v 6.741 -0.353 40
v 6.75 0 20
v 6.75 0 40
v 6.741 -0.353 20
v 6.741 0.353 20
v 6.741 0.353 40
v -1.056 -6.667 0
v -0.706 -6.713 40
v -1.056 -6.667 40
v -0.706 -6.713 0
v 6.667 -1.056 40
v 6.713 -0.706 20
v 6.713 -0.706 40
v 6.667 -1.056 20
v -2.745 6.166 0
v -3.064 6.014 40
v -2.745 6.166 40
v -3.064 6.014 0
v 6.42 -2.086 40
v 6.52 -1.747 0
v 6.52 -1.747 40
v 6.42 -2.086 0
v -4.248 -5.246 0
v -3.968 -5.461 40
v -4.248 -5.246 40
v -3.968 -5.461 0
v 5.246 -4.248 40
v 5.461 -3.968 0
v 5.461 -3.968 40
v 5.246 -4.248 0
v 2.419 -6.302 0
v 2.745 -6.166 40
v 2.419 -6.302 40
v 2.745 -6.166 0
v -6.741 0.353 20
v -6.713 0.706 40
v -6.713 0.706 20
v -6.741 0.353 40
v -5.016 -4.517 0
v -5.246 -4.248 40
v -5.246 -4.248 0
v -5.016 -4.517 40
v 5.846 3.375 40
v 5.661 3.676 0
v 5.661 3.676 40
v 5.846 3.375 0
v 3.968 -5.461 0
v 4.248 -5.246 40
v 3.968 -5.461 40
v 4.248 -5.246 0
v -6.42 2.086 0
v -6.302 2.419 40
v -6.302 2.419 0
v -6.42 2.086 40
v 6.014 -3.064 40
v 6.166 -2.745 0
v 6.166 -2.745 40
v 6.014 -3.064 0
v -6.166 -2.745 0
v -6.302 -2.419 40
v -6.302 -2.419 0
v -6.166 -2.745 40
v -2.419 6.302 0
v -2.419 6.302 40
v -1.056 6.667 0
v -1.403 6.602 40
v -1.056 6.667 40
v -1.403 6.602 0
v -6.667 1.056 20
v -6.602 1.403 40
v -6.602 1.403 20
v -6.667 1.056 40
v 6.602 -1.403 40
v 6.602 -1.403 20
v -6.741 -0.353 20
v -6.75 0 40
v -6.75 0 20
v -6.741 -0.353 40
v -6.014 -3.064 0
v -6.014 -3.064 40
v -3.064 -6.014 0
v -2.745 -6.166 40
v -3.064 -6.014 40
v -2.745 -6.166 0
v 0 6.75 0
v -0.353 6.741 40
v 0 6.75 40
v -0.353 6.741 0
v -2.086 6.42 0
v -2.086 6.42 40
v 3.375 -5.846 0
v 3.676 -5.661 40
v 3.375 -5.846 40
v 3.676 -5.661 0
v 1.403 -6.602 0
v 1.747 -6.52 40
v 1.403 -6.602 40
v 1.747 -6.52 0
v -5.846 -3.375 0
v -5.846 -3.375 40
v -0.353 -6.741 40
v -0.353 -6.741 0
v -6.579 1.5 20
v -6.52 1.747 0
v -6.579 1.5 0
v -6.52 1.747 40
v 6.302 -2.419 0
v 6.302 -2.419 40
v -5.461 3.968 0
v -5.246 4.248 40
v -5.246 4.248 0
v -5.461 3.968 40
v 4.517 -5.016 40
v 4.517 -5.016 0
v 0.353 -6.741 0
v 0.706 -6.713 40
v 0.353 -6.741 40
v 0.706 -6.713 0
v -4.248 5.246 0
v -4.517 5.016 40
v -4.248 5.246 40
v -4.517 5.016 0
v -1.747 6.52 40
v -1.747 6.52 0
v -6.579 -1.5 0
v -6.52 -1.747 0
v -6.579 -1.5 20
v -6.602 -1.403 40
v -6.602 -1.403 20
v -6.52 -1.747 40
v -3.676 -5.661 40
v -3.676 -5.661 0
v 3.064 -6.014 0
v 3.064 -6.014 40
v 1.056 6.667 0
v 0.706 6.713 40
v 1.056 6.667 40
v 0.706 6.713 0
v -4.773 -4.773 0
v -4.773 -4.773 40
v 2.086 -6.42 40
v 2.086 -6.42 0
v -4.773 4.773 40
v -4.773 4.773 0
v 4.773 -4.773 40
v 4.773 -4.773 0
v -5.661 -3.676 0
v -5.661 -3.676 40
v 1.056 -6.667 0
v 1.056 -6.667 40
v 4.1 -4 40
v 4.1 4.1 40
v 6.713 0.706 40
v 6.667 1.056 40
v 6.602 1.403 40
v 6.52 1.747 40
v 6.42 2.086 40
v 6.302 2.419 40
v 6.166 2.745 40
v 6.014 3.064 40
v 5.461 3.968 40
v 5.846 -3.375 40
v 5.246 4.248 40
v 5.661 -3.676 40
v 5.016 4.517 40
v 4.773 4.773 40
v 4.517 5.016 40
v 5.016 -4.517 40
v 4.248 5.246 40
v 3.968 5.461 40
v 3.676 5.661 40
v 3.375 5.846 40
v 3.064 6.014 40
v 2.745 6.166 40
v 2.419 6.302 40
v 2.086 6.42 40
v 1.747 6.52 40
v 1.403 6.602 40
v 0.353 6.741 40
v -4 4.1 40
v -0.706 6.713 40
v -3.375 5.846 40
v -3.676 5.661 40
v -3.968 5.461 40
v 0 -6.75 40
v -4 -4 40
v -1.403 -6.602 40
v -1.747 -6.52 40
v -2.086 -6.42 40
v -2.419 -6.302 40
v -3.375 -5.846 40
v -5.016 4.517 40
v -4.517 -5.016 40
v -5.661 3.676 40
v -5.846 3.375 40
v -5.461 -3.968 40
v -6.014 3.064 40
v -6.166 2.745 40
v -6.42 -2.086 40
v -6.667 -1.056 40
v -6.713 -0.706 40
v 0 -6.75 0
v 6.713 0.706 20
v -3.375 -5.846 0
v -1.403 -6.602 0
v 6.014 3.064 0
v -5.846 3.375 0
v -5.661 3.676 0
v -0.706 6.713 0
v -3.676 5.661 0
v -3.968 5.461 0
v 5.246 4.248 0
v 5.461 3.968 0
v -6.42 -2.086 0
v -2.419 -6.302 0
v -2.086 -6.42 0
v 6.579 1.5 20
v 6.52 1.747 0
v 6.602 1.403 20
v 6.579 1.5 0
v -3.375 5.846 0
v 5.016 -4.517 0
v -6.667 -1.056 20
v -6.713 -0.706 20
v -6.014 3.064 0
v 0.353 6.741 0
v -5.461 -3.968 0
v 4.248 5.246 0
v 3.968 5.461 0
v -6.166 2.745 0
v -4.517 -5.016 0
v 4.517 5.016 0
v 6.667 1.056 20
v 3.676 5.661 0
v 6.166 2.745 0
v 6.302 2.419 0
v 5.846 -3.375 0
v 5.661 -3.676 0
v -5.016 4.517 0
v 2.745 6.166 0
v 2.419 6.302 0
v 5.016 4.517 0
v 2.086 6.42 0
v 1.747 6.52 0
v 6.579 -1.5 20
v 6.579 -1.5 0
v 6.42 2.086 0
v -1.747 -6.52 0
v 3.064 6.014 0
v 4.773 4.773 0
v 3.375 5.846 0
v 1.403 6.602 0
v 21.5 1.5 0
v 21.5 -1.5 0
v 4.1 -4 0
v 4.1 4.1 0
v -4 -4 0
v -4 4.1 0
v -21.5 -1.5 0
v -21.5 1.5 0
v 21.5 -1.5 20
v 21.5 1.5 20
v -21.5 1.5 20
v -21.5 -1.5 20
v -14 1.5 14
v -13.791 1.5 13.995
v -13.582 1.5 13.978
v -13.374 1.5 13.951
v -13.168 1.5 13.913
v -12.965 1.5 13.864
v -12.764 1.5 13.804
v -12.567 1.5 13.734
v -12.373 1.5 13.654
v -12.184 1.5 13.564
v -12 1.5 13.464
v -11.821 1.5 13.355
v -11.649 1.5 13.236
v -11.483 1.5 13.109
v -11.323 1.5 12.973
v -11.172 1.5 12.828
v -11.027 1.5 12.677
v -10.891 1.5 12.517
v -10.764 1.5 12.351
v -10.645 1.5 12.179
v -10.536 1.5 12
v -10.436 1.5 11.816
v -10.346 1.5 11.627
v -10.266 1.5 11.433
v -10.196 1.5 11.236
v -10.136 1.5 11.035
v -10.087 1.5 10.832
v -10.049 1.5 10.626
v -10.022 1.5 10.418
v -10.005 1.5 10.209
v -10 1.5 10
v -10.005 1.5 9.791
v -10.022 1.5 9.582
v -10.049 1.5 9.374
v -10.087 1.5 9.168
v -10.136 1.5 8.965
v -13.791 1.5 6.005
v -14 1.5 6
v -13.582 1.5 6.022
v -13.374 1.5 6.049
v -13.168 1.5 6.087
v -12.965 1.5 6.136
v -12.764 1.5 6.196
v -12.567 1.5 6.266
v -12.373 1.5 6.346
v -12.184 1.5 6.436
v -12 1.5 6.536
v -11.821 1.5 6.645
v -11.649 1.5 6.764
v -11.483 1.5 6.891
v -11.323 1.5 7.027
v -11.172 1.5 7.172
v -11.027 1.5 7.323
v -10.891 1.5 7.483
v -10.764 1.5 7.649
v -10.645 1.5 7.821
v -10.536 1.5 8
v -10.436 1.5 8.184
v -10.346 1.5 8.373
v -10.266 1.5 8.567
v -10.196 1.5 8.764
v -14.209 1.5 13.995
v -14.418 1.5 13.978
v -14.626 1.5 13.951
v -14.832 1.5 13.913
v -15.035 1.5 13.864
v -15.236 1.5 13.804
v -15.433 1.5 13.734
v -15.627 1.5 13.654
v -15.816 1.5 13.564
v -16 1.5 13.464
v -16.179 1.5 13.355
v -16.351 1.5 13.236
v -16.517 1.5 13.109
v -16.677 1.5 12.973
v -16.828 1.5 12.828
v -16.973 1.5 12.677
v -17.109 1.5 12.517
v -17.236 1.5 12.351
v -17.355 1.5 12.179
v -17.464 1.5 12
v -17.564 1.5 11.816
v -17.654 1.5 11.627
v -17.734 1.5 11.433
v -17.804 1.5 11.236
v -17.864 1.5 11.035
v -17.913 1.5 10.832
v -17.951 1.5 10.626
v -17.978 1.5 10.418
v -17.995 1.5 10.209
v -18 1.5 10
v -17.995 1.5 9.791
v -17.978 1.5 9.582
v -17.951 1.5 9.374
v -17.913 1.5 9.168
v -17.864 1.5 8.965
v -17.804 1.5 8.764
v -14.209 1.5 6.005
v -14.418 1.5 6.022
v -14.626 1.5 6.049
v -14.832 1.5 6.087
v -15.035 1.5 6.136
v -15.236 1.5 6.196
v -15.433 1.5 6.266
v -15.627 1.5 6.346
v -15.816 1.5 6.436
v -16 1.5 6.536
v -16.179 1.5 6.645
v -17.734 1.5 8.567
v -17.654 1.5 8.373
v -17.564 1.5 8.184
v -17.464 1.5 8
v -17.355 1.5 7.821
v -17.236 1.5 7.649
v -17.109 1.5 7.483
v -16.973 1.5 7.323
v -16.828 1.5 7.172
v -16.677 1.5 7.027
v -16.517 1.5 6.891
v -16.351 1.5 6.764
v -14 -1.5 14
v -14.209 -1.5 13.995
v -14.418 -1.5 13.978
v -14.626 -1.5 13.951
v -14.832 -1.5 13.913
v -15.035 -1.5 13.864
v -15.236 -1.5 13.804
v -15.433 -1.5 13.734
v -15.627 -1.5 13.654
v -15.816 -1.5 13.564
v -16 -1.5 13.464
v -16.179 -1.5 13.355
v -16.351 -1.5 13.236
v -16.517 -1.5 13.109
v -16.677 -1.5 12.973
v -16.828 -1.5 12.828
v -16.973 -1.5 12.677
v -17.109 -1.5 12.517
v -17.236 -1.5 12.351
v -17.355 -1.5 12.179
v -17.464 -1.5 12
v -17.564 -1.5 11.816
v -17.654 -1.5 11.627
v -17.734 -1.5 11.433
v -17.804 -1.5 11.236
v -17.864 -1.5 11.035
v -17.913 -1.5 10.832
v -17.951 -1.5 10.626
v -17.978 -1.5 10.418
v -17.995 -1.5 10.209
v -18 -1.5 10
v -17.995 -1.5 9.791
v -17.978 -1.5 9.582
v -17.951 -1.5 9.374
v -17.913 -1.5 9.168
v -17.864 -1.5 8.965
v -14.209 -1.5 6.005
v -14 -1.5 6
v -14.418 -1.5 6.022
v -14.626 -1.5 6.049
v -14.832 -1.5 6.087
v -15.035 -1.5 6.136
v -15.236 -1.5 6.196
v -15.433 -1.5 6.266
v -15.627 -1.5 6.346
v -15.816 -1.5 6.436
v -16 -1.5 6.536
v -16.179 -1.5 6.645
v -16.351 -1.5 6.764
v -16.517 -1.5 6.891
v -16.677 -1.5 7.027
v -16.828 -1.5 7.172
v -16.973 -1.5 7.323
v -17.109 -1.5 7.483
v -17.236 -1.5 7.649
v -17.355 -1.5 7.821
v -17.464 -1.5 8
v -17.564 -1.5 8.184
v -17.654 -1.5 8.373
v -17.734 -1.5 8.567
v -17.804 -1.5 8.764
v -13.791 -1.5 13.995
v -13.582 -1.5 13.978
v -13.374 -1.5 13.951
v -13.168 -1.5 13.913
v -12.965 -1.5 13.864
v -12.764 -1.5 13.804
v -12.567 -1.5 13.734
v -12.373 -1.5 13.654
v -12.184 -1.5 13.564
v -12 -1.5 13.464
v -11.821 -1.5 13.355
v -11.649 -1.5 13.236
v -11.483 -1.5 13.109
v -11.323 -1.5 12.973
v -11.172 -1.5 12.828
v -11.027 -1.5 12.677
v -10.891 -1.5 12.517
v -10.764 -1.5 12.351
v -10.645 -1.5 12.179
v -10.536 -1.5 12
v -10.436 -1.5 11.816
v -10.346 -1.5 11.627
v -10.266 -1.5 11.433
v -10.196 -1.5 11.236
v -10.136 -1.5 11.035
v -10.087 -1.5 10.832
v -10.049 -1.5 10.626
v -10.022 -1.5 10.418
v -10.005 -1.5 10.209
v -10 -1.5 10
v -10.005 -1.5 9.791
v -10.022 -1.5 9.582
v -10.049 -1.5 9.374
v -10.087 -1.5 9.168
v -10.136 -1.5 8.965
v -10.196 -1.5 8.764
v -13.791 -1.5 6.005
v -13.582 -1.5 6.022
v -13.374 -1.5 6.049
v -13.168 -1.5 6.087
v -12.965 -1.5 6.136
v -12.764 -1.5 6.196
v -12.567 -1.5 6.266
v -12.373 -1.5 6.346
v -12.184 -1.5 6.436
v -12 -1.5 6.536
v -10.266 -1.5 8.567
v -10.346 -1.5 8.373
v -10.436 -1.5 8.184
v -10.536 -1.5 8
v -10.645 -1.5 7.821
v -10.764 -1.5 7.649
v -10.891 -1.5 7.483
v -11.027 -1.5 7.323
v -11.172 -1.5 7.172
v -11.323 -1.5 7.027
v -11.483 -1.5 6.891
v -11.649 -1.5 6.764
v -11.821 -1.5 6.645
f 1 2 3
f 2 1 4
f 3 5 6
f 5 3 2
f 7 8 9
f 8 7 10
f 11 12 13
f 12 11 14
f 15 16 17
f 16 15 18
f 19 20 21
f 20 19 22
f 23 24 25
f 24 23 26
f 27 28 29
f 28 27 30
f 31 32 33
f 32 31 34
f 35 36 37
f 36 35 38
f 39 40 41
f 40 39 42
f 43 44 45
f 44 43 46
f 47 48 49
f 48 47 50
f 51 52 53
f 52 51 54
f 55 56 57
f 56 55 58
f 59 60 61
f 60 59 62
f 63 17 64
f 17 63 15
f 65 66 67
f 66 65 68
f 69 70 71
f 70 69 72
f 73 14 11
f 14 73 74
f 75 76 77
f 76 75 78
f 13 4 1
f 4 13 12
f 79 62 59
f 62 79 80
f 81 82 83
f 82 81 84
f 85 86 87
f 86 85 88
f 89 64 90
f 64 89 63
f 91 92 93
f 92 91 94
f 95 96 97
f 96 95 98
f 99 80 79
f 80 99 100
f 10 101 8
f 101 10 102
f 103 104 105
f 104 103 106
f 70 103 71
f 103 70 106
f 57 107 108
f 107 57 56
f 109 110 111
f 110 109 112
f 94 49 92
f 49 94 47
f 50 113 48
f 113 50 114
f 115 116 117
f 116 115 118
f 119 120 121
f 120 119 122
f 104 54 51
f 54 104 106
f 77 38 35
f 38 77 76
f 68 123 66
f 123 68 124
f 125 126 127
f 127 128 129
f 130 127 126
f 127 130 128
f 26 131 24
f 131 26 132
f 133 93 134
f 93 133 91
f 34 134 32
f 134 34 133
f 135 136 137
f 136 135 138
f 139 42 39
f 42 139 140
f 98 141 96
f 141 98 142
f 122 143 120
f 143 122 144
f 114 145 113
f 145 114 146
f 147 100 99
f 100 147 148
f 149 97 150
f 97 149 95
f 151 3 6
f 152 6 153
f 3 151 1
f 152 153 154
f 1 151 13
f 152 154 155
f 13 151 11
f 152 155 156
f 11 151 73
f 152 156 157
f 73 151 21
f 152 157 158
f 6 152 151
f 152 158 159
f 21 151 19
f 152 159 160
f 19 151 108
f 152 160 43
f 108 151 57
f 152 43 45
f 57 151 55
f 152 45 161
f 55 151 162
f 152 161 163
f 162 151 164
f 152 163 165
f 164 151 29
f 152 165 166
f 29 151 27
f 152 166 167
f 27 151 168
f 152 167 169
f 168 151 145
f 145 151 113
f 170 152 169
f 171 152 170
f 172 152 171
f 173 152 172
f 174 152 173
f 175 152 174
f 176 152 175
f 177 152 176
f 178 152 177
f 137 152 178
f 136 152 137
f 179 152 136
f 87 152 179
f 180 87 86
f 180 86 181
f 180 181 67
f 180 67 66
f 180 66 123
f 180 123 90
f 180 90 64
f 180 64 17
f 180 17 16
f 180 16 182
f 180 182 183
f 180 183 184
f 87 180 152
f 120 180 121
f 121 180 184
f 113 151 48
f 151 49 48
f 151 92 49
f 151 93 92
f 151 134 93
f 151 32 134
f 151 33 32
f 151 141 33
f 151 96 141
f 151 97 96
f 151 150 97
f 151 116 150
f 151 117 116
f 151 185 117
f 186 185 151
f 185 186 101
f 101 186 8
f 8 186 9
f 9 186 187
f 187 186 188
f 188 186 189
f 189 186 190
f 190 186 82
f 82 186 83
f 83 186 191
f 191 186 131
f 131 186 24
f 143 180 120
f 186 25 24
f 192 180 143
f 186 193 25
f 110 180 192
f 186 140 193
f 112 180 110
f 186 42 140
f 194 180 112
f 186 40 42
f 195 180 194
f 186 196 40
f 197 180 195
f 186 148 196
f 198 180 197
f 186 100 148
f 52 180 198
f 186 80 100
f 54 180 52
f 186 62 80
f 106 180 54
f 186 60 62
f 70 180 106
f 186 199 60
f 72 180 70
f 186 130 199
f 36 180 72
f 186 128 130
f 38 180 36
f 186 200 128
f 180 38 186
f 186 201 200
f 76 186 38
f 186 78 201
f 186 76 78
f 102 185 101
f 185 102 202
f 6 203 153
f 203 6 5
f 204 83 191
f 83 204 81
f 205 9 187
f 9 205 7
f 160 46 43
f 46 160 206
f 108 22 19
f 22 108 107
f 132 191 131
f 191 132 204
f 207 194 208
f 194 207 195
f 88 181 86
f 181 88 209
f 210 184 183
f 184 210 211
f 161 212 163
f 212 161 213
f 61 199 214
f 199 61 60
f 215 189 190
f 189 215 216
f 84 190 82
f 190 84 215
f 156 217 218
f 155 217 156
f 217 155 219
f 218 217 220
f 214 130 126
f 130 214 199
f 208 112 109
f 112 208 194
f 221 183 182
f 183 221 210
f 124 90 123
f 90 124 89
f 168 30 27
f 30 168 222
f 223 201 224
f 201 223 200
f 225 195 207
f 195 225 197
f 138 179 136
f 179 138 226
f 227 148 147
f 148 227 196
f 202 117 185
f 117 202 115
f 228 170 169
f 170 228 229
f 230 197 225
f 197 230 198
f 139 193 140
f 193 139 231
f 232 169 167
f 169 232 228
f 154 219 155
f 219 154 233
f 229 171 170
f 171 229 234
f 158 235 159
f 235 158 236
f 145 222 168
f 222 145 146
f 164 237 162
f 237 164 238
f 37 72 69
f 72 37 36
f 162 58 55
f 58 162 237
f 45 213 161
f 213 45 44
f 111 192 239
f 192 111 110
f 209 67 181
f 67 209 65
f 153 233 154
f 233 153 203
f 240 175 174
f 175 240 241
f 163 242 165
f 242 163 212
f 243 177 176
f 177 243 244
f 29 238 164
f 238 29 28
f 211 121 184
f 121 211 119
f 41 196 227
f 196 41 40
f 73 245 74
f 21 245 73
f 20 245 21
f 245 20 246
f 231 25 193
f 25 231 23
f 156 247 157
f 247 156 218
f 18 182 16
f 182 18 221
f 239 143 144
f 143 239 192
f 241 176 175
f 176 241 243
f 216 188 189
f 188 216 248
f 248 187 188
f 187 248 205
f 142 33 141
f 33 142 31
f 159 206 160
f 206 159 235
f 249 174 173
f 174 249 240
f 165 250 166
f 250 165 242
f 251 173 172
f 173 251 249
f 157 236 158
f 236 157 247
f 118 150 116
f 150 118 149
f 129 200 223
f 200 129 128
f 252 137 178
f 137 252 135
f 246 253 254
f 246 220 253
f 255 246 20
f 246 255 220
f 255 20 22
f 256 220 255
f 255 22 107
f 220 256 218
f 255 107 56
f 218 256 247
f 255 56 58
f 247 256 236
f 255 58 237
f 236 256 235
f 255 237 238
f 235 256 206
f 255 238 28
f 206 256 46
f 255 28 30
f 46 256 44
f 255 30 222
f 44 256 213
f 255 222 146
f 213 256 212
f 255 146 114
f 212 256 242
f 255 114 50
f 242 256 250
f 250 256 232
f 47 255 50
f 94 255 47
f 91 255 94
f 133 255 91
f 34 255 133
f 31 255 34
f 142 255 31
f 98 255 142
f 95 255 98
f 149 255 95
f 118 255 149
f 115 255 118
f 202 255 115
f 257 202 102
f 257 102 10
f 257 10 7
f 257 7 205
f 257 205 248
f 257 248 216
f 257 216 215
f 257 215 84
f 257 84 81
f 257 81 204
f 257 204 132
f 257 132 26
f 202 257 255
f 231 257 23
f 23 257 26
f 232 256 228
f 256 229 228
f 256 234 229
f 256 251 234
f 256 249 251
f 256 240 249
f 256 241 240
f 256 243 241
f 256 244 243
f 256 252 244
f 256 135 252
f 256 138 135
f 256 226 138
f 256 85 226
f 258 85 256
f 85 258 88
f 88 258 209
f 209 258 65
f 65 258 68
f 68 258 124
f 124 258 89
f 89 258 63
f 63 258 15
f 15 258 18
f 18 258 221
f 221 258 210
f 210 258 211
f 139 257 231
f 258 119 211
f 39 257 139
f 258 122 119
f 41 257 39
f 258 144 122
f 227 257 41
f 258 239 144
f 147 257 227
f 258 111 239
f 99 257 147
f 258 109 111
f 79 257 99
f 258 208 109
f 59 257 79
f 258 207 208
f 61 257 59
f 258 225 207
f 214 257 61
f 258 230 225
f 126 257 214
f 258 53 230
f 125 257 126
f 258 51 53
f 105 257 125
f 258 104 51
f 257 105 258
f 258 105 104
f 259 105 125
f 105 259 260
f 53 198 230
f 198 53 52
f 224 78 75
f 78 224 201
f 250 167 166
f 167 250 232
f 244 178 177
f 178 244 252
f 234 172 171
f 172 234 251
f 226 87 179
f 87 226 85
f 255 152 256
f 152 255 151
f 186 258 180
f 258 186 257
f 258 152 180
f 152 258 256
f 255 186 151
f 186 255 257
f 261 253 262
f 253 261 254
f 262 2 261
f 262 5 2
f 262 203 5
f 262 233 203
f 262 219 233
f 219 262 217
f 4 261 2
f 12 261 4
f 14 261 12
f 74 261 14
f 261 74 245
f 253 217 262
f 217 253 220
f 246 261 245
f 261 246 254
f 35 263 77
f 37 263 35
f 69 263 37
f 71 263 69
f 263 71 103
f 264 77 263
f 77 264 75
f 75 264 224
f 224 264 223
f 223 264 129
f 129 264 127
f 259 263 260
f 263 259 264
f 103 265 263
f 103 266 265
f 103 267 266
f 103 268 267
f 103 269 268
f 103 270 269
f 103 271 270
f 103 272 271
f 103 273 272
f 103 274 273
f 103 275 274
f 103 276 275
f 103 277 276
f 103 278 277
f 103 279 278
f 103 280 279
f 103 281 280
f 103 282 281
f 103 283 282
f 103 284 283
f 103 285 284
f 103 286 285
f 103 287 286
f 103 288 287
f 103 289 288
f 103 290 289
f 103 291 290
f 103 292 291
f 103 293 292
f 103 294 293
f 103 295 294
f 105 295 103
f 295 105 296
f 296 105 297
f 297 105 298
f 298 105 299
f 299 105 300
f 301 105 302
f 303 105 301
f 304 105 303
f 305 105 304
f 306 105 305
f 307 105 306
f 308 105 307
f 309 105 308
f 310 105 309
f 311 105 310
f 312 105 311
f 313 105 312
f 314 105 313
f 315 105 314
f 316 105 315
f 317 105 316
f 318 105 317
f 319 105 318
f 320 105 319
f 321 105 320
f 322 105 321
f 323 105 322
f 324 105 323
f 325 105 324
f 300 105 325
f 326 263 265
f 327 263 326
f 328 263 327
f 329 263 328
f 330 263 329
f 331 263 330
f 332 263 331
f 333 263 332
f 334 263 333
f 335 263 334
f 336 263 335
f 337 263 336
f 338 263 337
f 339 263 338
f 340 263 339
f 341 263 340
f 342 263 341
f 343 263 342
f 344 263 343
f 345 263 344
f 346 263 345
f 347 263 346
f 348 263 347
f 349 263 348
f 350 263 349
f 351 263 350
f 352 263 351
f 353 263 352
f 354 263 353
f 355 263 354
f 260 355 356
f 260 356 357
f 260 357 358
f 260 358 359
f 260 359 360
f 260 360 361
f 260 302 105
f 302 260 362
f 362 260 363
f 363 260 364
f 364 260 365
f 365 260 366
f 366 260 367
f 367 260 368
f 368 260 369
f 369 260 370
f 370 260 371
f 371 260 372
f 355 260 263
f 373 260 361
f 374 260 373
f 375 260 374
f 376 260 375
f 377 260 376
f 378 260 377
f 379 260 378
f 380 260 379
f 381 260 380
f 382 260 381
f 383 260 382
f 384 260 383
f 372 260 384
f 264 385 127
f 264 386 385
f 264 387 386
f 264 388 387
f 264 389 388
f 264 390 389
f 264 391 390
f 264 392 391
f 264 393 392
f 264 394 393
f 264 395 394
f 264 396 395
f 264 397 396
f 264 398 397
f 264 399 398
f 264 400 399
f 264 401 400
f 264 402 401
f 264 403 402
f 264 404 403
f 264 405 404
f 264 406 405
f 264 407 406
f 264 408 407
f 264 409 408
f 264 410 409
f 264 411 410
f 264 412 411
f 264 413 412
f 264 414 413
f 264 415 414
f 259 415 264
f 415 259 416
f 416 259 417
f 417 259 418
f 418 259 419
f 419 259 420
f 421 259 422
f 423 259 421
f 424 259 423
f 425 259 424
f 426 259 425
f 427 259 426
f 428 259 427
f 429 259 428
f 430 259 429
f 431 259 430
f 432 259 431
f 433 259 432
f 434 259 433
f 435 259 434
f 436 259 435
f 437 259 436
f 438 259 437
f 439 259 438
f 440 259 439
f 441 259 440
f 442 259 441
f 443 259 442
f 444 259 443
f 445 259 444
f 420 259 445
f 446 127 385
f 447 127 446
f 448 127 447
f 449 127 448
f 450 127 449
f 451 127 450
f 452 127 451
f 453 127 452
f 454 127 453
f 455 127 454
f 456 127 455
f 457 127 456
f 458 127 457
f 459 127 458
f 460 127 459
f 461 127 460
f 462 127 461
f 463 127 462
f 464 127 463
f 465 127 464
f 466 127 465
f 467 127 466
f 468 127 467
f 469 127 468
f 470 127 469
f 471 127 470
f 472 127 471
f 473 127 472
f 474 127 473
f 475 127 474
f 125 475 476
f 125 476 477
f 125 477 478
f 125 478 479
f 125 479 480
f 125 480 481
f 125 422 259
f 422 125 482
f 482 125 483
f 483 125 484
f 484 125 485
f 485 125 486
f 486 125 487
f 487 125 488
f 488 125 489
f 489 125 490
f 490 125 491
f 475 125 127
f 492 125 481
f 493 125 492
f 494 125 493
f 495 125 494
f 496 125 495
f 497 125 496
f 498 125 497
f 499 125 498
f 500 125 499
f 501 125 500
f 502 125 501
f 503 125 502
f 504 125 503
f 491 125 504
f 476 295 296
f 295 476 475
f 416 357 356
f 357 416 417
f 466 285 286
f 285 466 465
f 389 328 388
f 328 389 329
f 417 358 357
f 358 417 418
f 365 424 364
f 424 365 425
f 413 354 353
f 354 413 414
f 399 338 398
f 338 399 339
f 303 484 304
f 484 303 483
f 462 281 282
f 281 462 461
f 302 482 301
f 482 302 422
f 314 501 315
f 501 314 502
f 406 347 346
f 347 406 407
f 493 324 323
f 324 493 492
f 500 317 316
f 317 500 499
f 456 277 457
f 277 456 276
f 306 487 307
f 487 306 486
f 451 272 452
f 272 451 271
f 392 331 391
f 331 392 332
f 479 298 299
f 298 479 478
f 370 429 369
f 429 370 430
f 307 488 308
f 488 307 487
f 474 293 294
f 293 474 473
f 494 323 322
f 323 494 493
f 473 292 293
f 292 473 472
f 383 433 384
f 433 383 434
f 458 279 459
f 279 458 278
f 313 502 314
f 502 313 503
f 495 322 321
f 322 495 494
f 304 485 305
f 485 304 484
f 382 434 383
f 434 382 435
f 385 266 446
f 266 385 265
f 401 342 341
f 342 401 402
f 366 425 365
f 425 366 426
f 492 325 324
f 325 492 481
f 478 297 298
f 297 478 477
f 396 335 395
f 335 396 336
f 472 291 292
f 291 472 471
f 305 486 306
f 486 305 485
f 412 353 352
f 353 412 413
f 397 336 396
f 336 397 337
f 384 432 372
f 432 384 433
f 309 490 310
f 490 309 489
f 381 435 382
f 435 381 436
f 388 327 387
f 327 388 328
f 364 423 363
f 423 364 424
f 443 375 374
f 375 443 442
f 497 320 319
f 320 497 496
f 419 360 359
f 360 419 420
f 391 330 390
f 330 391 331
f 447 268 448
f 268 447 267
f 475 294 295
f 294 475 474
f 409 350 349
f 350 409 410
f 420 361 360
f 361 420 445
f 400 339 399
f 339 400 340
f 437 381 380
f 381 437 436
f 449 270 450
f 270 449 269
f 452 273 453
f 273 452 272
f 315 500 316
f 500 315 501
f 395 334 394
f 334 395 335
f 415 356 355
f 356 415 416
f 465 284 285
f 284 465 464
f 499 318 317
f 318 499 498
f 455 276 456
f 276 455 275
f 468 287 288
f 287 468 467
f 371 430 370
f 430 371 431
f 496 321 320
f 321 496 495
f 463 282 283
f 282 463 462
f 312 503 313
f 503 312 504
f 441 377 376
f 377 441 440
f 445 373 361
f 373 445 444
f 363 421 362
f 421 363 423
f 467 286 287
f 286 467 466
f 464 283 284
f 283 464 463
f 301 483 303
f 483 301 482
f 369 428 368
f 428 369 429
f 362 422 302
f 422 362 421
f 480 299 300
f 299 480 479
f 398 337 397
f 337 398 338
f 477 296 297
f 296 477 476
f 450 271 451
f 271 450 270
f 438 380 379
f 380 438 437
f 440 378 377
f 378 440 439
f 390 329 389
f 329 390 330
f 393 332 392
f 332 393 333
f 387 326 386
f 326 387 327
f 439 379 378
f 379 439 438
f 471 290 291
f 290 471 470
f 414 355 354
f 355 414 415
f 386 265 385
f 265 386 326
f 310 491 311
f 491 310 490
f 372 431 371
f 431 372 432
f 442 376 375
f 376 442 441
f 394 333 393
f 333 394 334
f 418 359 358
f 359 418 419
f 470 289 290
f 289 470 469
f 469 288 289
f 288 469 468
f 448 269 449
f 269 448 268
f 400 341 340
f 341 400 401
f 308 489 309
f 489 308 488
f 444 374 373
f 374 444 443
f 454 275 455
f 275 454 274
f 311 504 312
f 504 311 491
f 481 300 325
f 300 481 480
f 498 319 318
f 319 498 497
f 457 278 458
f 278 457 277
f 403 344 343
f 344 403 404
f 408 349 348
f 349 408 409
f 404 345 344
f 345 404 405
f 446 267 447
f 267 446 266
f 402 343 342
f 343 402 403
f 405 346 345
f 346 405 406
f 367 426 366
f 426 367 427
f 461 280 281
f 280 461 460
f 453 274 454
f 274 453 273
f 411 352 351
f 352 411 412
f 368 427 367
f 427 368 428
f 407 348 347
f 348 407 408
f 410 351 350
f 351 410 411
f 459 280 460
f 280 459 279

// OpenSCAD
difference() {
    union(){
        difference(){
            linear_extrude(height=40) circle(d=13.5, $fn=120);
            translate([-4,-4,-1]) cube([8.1,8.1,42]);
        }
        translate([6.5,-1.5,0]) cube([15,3,20]);
        translate([-15-6.5,-1.5,0]) cube([15,3,20]);
    }
    // keyhole
    translate([-7.5-13/2,2.5,10]) rotate([90,0,0]) linear_extrude(height=5) circle(d=8, $fn=120);
}
